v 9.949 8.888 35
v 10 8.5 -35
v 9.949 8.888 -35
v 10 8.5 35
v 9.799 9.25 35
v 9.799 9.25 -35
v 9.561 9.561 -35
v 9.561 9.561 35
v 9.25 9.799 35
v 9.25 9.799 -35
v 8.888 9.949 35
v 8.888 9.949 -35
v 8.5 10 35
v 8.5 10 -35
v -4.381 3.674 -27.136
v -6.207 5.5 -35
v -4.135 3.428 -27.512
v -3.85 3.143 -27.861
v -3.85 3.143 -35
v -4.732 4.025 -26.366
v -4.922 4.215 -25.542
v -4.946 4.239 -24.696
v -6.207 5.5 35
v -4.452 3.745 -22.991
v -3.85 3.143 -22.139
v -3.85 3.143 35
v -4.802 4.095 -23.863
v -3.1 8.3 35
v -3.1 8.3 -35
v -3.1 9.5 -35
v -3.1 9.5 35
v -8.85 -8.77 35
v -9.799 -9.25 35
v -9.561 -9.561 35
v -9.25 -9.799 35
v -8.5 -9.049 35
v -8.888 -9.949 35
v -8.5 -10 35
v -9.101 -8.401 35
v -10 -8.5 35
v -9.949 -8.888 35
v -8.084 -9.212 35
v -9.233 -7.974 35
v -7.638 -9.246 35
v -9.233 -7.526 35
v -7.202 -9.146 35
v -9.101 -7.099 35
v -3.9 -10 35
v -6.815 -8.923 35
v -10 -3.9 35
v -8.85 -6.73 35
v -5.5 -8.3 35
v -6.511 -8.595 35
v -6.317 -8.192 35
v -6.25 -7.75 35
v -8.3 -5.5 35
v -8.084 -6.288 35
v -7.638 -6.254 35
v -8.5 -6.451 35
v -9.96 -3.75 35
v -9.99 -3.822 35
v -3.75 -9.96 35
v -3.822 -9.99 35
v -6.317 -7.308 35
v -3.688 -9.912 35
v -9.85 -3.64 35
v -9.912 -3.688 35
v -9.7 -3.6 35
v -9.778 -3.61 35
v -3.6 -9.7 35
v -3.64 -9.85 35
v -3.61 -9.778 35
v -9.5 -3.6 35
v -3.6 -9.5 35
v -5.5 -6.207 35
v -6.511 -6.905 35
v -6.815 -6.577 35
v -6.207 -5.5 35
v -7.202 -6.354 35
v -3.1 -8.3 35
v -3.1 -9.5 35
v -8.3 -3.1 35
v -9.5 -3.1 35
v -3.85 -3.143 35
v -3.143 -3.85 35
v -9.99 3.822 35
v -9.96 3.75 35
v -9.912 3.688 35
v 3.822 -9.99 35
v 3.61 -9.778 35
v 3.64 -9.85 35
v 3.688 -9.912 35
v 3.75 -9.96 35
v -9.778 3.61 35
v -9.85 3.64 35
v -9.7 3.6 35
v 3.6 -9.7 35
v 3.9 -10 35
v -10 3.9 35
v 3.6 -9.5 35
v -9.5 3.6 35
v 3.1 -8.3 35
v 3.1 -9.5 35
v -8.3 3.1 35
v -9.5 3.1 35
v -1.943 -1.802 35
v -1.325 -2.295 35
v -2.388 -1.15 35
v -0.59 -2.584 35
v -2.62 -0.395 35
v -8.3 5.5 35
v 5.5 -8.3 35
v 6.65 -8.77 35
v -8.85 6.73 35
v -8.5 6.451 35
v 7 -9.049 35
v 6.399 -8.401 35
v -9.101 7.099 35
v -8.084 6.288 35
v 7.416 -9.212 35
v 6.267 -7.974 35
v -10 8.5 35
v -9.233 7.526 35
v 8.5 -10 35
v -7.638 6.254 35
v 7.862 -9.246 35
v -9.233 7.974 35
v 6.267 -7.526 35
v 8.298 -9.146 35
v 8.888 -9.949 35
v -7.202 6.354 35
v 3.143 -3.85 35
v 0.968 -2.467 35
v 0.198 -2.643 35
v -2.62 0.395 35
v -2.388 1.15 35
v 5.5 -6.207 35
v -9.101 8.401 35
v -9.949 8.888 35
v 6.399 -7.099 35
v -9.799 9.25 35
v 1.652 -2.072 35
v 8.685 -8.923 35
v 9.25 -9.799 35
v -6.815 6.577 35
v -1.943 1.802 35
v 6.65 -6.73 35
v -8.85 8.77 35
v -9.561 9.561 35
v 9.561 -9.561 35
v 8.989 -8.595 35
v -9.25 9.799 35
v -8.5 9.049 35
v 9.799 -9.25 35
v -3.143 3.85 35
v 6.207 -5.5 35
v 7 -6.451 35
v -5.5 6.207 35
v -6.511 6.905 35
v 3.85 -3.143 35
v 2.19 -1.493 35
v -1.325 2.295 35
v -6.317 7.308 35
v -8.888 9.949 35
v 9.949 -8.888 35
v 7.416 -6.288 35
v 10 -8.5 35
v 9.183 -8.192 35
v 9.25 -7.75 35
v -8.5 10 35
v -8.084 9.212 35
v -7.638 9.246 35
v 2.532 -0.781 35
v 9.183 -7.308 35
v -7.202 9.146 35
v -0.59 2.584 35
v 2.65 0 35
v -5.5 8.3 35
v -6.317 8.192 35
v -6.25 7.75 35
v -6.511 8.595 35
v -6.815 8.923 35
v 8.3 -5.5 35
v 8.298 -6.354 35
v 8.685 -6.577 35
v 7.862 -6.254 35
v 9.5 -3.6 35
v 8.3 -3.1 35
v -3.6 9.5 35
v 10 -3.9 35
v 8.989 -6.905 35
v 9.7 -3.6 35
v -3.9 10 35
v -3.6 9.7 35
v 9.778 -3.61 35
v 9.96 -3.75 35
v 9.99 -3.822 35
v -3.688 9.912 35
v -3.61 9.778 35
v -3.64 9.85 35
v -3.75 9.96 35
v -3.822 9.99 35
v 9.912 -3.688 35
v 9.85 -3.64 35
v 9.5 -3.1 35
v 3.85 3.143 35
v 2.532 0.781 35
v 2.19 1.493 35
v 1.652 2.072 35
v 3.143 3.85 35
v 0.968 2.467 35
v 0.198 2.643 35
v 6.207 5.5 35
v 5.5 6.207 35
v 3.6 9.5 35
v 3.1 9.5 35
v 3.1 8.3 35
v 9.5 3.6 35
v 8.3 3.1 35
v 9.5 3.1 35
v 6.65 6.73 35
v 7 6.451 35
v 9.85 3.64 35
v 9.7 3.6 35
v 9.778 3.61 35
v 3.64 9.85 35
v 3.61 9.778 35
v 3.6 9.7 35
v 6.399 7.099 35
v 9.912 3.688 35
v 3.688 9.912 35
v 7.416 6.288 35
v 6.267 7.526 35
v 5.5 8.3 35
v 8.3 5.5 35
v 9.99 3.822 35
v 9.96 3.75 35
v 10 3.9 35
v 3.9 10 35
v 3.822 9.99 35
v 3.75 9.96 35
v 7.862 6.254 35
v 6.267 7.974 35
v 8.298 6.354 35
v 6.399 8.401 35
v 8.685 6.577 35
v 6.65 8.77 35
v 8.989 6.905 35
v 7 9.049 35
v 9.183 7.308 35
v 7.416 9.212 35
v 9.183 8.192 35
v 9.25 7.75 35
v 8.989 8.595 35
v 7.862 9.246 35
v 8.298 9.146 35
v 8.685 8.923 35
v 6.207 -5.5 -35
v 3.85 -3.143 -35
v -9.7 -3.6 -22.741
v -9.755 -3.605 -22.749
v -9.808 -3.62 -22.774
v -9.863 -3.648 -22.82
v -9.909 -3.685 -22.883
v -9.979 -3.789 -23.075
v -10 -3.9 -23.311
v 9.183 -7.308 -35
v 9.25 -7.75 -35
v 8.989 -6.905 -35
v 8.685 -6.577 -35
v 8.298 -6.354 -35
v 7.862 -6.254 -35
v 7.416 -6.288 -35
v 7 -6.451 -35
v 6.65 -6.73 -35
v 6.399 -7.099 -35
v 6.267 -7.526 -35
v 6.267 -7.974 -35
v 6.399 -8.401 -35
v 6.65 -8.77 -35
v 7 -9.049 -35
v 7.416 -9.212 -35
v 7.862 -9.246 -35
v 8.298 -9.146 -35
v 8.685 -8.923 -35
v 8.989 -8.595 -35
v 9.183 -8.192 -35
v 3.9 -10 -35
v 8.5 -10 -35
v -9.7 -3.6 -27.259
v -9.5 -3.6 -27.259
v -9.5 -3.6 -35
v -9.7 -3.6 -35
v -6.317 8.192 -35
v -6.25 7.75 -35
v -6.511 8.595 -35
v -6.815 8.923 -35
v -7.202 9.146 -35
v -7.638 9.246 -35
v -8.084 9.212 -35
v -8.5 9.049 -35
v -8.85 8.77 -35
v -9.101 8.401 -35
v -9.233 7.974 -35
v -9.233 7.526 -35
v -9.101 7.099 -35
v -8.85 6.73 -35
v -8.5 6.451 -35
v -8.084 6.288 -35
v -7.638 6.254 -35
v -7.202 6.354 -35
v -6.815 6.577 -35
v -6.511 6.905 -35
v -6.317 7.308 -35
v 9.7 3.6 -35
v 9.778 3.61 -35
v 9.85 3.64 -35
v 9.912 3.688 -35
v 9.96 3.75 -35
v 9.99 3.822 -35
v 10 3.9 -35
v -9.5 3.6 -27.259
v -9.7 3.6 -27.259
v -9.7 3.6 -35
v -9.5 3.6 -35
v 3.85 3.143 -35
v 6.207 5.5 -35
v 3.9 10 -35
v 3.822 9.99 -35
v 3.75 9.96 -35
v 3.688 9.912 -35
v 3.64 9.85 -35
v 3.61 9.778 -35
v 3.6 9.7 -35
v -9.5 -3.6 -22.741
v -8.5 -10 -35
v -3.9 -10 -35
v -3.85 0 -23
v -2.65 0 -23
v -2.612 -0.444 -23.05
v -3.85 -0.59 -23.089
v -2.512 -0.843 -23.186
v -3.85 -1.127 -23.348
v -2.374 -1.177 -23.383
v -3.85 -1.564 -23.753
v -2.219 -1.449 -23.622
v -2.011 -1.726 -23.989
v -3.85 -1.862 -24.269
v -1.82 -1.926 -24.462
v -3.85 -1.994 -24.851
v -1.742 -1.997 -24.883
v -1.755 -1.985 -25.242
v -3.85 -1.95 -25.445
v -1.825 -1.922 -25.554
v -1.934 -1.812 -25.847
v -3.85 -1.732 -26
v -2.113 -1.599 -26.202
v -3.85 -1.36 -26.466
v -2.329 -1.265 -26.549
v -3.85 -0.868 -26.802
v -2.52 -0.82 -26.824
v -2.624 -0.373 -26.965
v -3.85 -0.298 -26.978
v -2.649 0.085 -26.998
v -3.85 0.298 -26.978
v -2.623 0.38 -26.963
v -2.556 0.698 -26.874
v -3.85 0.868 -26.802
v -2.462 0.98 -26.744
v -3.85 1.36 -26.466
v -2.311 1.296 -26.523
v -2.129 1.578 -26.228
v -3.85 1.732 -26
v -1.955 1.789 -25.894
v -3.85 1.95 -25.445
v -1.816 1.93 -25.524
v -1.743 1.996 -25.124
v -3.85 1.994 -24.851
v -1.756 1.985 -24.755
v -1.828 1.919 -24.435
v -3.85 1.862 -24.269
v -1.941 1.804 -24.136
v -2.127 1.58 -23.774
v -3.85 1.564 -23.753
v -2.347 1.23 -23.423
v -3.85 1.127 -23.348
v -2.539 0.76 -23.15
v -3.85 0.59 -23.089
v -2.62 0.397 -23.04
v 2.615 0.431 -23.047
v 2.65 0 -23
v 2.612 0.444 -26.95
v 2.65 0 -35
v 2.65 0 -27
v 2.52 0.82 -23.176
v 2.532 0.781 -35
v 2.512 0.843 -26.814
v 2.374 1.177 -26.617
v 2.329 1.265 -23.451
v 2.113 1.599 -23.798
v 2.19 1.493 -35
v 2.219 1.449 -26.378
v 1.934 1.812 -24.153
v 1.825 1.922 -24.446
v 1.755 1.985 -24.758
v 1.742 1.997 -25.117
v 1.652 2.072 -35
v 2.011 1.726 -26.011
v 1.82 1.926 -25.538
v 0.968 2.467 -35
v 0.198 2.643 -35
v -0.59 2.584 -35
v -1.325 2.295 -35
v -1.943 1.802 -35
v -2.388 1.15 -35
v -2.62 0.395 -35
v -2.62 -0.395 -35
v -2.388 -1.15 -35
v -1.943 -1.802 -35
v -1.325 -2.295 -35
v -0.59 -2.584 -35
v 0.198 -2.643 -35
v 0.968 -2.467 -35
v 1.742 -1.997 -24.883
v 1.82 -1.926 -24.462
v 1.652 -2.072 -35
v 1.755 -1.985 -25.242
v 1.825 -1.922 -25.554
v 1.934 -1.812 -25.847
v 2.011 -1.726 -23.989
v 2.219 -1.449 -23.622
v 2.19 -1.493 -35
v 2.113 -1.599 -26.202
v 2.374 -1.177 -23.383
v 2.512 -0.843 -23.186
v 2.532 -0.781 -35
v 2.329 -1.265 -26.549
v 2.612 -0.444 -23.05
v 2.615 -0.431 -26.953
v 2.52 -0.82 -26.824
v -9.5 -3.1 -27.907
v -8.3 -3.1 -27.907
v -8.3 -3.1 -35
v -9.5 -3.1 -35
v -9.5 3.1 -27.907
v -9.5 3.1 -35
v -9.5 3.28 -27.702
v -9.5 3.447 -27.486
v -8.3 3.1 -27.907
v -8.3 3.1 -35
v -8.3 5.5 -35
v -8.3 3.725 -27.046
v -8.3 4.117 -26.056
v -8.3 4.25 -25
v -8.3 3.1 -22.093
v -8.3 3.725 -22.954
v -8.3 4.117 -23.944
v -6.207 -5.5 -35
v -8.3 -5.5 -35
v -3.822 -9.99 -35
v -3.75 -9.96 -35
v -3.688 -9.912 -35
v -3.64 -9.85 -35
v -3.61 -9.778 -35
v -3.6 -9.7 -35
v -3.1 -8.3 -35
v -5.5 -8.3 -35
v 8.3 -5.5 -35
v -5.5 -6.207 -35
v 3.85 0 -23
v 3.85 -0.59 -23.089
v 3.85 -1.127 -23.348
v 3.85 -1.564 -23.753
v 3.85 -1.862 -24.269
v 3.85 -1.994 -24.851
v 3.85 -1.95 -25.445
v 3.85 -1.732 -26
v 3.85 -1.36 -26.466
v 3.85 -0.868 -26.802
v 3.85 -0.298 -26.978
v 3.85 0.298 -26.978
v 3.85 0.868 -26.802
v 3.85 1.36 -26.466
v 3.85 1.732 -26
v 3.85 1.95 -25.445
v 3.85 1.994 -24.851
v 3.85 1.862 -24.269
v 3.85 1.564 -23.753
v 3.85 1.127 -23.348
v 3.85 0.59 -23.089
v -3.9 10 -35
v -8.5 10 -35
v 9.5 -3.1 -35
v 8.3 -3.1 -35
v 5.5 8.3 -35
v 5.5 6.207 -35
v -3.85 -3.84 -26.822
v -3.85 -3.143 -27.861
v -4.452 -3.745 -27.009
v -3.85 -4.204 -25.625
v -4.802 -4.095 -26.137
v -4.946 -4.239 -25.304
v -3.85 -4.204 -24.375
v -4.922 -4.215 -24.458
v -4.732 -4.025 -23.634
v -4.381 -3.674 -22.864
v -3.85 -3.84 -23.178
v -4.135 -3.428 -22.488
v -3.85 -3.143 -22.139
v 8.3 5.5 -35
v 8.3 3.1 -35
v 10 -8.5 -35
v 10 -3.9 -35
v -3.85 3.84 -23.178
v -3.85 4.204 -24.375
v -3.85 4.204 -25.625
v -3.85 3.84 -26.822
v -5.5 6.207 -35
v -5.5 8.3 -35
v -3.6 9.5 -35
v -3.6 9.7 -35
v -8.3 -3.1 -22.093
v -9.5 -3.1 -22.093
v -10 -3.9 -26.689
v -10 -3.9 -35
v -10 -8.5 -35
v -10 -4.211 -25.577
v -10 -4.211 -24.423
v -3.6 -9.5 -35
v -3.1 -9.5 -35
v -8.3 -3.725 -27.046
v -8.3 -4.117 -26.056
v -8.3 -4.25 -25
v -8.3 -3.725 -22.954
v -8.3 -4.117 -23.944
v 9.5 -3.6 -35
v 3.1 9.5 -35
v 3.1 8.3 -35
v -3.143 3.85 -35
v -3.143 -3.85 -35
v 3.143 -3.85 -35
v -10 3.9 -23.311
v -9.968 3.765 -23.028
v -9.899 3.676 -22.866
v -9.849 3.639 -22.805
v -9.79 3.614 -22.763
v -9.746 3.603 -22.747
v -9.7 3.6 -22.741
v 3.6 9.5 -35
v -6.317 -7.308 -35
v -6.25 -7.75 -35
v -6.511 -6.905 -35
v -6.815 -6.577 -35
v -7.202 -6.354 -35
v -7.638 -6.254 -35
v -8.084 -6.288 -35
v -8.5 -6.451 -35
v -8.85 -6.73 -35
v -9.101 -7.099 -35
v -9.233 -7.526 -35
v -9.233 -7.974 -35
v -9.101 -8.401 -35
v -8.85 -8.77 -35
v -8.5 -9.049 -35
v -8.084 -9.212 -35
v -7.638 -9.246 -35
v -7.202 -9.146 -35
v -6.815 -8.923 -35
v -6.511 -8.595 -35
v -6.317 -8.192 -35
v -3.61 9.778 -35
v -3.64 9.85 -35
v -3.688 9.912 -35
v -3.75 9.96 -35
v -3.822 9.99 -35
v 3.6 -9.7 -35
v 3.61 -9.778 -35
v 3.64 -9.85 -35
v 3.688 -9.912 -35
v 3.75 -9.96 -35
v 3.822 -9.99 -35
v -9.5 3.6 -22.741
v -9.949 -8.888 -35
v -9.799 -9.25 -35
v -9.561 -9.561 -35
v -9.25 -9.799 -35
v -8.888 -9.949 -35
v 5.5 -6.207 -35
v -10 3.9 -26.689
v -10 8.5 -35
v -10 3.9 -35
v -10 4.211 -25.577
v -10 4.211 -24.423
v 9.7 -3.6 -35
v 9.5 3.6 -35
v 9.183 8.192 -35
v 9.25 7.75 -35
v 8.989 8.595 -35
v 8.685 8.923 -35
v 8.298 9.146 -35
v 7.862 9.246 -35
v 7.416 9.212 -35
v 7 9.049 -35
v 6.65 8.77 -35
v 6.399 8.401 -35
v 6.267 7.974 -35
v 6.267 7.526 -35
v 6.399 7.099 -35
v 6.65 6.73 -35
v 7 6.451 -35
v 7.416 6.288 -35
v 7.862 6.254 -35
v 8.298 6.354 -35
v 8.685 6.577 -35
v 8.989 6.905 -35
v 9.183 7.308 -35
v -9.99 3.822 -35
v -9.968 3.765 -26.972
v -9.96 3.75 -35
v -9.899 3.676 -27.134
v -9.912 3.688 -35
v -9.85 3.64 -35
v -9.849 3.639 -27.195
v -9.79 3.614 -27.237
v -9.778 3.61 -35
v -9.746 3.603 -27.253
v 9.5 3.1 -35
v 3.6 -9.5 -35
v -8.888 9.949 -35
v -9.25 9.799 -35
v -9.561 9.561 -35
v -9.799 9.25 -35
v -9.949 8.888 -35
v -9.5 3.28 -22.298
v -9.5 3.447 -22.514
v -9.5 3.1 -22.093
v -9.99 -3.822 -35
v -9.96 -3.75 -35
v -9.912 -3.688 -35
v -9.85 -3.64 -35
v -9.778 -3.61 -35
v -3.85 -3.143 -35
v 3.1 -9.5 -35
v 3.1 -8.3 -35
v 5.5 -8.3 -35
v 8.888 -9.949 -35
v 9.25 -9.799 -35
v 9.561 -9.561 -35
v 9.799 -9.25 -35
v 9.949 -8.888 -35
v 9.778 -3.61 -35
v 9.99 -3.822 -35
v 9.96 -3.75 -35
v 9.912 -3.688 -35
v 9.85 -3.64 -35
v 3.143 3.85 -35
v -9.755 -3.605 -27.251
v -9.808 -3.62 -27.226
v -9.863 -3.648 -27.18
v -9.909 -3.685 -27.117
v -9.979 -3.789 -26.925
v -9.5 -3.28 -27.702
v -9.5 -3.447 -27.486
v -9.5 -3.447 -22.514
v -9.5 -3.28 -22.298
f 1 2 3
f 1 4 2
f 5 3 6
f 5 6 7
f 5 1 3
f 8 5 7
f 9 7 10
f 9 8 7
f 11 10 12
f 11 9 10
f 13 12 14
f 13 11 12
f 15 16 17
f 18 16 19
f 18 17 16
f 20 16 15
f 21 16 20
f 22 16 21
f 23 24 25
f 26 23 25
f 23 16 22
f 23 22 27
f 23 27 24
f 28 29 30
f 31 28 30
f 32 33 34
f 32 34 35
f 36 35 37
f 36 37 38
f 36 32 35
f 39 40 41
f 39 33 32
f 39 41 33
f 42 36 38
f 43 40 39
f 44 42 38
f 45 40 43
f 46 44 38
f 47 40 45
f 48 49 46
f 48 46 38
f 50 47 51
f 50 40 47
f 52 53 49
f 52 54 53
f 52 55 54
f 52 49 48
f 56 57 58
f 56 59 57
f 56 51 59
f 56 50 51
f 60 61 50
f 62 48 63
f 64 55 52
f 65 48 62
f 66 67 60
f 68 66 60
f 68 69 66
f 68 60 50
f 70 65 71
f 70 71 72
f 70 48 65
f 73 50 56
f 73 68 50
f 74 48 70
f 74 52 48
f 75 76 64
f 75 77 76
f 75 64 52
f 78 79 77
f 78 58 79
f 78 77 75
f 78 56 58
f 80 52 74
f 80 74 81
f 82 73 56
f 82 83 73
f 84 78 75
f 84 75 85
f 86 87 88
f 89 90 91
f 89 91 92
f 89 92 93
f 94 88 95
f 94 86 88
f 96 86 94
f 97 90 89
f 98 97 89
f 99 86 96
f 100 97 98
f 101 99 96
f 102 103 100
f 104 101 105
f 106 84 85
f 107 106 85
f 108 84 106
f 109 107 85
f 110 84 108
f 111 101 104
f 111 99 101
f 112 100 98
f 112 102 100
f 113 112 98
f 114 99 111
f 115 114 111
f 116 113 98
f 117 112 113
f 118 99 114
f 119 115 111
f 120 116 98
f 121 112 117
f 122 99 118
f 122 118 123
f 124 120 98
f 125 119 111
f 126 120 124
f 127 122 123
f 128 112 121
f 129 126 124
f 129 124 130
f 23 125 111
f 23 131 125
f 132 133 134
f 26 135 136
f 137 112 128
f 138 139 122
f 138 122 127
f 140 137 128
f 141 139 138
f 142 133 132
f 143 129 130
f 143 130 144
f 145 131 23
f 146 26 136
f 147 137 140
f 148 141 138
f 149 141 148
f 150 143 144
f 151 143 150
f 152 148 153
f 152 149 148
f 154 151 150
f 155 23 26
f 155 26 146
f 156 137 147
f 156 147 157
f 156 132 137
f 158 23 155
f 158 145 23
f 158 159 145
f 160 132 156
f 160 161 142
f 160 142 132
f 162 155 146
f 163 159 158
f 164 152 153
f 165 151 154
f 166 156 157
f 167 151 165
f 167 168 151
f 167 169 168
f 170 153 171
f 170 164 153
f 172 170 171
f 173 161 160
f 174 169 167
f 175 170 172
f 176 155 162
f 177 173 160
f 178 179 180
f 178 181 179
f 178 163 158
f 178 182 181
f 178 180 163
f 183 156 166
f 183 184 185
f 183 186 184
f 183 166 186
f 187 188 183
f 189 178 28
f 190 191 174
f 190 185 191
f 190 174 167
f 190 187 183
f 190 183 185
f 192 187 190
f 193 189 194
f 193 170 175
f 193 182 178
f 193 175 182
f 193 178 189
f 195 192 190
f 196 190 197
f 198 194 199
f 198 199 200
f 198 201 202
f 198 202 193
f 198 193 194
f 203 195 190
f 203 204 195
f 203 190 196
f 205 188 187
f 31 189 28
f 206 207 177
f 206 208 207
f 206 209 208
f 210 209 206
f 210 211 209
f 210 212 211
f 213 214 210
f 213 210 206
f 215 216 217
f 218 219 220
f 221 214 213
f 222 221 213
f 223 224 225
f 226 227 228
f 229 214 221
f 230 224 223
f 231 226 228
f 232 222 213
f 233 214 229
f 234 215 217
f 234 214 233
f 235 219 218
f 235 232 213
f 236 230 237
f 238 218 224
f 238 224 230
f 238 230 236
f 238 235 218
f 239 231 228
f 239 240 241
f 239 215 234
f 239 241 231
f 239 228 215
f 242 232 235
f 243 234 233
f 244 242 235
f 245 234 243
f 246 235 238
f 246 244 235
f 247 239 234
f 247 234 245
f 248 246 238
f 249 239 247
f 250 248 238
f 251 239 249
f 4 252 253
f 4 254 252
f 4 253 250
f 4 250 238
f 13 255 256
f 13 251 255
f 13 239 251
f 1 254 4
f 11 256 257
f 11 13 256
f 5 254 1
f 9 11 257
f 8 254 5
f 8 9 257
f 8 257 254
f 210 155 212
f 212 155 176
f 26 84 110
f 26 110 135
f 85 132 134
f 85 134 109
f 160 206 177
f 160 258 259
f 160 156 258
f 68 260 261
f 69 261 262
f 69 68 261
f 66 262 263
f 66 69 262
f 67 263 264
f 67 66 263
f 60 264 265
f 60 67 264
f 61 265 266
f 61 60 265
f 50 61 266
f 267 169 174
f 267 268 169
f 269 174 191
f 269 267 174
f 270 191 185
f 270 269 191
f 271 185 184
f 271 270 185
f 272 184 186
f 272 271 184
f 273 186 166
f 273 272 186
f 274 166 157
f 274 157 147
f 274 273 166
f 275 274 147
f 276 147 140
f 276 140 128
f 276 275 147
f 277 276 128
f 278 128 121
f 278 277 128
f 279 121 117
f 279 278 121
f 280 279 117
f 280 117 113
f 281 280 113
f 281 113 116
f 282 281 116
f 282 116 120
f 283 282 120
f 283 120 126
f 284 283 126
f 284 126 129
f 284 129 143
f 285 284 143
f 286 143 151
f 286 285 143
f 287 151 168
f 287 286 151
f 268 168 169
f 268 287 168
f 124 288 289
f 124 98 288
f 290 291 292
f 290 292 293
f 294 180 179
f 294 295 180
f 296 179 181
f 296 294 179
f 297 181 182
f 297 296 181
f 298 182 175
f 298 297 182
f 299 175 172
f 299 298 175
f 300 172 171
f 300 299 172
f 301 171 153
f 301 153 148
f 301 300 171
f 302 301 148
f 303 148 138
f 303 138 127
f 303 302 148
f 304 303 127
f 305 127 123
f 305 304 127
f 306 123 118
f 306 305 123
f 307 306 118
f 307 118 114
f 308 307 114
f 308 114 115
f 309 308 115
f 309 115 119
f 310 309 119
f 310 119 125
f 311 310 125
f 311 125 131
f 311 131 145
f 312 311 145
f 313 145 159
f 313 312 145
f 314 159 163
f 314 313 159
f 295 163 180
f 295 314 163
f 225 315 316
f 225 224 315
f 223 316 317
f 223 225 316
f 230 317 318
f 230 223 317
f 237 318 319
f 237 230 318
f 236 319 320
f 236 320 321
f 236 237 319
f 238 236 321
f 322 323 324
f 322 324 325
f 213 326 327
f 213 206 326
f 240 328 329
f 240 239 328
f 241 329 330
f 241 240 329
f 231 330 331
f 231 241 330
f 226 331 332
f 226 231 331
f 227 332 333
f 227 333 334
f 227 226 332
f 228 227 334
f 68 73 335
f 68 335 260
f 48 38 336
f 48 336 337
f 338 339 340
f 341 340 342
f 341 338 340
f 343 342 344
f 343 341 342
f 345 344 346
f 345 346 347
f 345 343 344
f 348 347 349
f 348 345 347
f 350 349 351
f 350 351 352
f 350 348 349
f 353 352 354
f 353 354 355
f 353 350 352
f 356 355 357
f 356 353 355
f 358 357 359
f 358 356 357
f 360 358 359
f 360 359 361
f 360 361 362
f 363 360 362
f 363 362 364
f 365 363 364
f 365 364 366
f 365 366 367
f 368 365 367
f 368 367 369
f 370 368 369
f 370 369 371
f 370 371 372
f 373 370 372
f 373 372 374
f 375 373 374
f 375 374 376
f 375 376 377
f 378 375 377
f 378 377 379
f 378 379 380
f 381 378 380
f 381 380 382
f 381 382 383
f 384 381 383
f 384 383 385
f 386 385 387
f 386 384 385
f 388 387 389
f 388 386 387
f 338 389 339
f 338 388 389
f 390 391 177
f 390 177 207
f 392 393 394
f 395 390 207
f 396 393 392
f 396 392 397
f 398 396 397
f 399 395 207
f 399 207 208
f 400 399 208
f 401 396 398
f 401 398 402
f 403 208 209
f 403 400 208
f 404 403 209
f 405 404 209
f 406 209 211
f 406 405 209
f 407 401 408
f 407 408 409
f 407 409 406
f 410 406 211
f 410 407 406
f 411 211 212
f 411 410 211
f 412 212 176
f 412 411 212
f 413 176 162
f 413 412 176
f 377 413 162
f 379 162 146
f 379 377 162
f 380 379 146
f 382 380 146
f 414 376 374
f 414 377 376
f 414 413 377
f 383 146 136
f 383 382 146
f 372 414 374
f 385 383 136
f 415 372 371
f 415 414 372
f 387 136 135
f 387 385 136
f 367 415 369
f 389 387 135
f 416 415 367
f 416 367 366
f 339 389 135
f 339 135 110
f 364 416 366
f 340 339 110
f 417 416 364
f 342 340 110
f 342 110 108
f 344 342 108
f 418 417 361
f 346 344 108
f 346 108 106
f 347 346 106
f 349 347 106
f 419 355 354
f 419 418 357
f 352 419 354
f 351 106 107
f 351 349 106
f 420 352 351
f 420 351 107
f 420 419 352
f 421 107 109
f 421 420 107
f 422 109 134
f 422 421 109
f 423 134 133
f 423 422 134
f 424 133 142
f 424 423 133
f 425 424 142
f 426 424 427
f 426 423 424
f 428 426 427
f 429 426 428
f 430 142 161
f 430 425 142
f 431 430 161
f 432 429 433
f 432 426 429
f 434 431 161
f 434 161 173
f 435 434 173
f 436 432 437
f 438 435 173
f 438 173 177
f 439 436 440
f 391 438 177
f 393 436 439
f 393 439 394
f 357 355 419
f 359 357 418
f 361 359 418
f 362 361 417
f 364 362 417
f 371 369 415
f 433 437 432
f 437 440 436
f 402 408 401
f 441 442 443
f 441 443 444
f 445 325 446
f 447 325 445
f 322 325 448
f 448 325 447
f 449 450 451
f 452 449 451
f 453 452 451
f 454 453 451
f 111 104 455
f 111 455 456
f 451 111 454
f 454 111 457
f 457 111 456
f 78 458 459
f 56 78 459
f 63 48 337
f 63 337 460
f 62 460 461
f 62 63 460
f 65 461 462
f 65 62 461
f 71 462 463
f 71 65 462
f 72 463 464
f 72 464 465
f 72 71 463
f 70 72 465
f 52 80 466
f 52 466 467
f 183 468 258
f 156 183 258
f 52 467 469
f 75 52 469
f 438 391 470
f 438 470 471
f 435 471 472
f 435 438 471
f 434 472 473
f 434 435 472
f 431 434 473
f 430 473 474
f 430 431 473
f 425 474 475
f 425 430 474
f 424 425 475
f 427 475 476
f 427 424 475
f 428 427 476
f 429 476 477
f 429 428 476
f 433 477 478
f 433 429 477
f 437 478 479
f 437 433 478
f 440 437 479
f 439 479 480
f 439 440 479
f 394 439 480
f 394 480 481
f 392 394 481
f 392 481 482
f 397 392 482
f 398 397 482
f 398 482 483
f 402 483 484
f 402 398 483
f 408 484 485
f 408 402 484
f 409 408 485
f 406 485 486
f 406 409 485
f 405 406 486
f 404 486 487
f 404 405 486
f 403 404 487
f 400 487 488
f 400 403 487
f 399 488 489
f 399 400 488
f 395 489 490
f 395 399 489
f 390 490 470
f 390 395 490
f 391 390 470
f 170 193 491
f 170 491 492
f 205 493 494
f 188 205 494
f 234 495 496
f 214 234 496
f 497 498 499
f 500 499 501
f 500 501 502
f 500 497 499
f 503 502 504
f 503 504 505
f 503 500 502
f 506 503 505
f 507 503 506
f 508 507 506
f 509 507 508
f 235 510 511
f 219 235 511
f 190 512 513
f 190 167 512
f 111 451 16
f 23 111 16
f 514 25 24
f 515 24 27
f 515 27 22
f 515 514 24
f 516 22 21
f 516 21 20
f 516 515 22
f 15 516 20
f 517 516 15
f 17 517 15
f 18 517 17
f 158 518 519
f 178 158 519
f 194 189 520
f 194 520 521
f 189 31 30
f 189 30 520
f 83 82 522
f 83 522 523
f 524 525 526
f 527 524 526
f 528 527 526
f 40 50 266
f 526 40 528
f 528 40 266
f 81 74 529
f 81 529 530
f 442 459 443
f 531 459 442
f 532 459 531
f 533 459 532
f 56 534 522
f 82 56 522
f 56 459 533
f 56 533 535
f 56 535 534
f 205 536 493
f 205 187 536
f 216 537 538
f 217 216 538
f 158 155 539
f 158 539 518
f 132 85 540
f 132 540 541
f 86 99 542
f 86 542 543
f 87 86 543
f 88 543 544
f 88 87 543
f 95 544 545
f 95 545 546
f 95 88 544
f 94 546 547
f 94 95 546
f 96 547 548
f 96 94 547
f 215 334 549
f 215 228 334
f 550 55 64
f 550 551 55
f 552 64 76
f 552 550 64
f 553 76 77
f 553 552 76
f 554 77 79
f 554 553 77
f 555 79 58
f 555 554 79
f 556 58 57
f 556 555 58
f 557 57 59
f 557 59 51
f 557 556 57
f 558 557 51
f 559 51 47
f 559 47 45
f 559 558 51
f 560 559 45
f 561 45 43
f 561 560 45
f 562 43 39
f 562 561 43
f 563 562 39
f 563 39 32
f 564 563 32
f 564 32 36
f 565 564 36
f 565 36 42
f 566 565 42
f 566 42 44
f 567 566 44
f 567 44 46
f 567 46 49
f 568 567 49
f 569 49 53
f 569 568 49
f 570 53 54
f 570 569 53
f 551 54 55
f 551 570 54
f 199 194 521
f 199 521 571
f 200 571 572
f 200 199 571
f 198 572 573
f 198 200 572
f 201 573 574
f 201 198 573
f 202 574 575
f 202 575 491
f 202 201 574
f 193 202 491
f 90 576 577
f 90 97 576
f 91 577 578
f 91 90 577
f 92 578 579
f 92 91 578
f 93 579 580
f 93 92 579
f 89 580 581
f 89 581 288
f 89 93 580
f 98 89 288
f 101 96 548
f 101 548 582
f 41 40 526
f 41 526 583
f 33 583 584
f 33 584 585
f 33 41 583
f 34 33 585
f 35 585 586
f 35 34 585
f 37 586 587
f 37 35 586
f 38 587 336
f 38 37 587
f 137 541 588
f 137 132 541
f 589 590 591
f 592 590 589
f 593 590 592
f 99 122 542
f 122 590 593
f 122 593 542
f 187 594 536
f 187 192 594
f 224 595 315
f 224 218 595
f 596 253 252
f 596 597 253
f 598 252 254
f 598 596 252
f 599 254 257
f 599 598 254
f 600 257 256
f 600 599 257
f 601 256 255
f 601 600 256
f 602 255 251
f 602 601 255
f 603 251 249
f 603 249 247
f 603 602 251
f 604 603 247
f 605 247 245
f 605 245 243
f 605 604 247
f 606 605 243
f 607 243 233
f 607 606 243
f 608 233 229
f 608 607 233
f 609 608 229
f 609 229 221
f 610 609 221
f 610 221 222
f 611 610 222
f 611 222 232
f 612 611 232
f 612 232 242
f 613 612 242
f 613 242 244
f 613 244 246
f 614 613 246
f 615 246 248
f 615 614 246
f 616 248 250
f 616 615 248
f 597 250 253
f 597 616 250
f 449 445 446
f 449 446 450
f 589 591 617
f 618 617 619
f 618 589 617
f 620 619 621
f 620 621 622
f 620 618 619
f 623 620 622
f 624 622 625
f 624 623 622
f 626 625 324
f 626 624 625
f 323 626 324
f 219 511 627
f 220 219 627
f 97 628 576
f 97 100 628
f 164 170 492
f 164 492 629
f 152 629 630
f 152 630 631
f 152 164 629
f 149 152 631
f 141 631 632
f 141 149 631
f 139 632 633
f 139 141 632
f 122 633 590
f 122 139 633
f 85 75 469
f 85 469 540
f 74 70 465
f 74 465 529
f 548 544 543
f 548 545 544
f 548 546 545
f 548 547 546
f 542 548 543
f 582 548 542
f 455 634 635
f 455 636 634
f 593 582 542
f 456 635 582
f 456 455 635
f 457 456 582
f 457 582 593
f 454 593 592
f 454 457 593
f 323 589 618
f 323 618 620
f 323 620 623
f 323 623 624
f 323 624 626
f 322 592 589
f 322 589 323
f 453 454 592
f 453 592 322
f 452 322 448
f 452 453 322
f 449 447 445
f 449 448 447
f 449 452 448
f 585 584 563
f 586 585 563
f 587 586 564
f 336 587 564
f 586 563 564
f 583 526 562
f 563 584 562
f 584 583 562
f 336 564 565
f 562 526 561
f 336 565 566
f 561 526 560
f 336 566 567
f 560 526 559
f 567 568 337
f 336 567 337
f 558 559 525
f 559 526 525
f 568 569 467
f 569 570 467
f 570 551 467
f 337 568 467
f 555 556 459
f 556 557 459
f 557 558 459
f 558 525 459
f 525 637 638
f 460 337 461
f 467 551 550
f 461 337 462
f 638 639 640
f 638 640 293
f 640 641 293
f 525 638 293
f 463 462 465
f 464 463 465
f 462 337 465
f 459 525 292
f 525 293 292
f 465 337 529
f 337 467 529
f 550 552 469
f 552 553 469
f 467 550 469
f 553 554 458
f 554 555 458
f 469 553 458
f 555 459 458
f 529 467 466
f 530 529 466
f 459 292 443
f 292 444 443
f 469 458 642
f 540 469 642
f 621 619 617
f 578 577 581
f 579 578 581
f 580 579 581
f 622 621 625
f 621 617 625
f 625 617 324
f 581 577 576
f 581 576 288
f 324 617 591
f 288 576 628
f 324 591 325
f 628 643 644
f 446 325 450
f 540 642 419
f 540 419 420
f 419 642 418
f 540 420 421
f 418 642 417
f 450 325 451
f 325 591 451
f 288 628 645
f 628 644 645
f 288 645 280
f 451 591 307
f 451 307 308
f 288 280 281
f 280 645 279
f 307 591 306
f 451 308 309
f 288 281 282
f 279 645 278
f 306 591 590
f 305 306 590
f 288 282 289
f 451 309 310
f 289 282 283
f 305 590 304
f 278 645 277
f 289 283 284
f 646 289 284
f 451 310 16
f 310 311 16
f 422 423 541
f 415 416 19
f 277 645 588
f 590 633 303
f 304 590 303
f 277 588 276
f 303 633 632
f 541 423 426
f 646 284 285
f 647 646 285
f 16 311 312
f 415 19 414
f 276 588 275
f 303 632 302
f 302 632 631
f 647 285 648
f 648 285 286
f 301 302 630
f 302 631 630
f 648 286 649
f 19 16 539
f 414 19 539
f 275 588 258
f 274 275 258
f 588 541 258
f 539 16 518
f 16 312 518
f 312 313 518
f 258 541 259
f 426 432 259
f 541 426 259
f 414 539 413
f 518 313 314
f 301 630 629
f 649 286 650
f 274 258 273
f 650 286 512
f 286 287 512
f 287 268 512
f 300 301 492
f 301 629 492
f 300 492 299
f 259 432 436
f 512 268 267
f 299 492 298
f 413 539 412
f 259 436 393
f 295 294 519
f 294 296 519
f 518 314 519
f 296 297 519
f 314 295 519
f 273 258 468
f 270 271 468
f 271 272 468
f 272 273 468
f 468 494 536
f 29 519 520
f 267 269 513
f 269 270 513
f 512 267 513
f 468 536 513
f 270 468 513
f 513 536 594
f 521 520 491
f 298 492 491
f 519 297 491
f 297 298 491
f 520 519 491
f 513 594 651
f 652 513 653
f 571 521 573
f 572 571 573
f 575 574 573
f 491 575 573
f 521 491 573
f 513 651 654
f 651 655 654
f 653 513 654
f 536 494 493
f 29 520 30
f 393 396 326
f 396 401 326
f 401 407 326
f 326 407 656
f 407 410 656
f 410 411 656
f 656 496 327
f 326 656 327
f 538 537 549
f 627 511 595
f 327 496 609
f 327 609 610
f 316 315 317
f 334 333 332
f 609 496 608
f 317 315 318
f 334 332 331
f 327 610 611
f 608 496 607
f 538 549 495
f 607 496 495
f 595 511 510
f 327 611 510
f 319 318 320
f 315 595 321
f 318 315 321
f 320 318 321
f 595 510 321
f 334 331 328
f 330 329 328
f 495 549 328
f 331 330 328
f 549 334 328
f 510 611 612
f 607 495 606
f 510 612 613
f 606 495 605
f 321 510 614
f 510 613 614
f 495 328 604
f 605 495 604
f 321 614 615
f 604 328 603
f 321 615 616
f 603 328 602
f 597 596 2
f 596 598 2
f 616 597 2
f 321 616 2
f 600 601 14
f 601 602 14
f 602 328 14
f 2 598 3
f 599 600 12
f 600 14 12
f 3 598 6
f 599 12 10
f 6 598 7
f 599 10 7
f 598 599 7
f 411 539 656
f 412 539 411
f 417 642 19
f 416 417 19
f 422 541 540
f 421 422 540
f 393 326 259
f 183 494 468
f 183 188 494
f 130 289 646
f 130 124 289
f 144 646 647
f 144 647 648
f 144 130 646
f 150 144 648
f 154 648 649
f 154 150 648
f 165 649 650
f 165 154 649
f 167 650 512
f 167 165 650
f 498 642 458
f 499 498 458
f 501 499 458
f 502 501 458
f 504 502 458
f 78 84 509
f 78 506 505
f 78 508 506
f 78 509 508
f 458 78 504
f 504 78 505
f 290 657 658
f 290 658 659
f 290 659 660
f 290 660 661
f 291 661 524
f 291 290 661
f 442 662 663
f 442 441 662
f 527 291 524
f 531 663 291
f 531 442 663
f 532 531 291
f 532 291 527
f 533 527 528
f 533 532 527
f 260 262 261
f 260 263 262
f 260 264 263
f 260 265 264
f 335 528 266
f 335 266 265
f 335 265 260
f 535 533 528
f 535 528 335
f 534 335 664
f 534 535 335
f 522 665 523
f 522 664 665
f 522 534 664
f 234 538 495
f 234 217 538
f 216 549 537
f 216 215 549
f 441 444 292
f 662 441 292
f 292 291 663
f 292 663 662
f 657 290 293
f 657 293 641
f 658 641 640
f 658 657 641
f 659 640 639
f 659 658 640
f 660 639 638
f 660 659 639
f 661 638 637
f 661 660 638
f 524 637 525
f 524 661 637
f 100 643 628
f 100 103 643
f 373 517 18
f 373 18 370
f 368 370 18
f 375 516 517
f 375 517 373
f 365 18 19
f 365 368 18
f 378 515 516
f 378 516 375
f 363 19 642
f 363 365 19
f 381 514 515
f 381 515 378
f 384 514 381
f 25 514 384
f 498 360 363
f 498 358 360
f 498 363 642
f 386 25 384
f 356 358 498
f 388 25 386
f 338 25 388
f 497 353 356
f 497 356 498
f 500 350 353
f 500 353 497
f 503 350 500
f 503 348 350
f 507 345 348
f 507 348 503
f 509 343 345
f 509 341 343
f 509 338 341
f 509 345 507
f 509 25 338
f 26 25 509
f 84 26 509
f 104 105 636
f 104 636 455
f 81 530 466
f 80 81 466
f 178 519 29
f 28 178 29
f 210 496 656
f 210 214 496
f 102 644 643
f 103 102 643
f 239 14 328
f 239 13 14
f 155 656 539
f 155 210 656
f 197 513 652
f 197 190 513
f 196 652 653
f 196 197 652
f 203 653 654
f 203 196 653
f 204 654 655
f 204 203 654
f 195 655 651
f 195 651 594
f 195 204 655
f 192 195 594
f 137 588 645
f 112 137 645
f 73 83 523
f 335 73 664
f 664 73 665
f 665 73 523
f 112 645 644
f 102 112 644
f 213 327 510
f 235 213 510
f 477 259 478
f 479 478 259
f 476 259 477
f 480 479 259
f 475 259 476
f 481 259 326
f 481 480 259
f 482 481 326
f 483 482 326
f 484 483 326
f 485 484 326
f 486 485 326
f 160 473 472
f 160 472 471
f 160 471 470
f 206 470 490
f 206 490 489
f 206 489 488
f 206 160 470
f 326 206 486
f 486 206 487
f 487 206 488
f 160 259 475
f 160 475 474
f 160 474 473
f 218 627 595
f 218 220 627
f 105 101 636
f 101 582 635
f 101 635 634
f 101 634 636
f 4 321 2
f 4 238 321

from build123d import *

# Parameters (mm, degrees)
SKETCH_1_R               = 2.65
SKETCH_1_R_2             = 1.5
EXTRUDE_1_DEPTH          = 35
CUT_EXTRUDE_3_DEPTH      = 38.749172176
CUT_EXTRUDE_3_DEPTH_BACK = 38.749172176
SKETCH_5_R               = 2
SKETCH_6_R               = 4.25
CUT_EXTRUDE_4_DEPTH      = 39.946405572


with BuildPart() as part:
    # 草图1 → 凸台-拉伸1 (new, symmetric)
    with BuildSketch(Plane.XY):
        with BuildLine():
            Line((3.142893219, 3.85), (-3.142893219, 3.85))
            Line((-3.142893219, 3.85), (-5.5, 6.207106781))
            Line((-5.5, 6.207106781), (-5.5, 8.3))
            Line((-5.5, 8.3), (-3.1, 8.3))
            Line((-3.1, 8.3), (-3.1, 9.5))
            Line((-3.1, 9.5), (-3.6, 9.5))
            Line((-3.6, 9.5), (-3.6, 9.7))
            ThreePointArc((-3.6, 9.7), (-3.687867966, 9.912132034), (-3.9, 10))
            Line((-3.9, 10), (-8.5, 10))
            ThreePointArc((-8.5, 10), (-9.560660172, 9.560660172), (-10, 8.5))
            Line((-10, 8.5), (-10, 3.9))
            ThreePointArc((-10, 3.9), (-9.912132034, 3.687867966), (-9.7, 3.6))
            Line((-9.7, 3.6), (-9.5, 3.6))
            Line((-9.5, 3.6), (-9.5, 3.1))
            Line((-9.5, 3.1), (-8.3, 3.1))
            Line((-8.3, 3.1), (-8.3, 5.5))
            Line((-8.3, 5.5), (-6.207106781, 5.5))
            Line((-6.207106781, 5.5), (-3.85, 3.142893219))
            Line((-3.85, 3.142893219), (-3.85, -3.142893219))
            Line((-3.85, -3.142893219), (-6.207106781, -5.5))
            Line((-6.207106781, -5.5), (-8.3, -5.5))
            Line((-8.3, -5.5), (-8.3, -3.1))
            Line((-8.3, -3.1), (-9.5, -3.1))
            Line((-9.5, -3.1), (-9.5, -3.6))
            Line((-9.5, -3.6), (-9.7, -3.6))
            ThreePointArc((-9.7, -3.6), (-9.912132034, -3.687867966), (-10, -3.9))
            Line((-10, -3.9), (-10, -8.5))
            ThreePointArc((-10, -8.5), (-9.560660172, -9.560660172), (-8.5, -10))
            Line((-8.5, -10), (-3.9, -10))
            ThreePointArc((-3.9, -10), (-3.687867966, -9.912132034), (-3.6, -9.7))
            Line((-3.6, -9.7), (-3.6, -9.5))
            Line((-3.6, -9.5), (-3.1, -9.5))
            Line((-3.1, -9.5), (-3.1, -8.3))
            Line((-3.1, -8.3), (-5.5, -8.3))
            Line((-5.5, -8.3), (-5.5, -6.207106781))
            Line((-5.5, -6.207106781), (-3.142893219, -3.85))
            Line((-3.142893219, -3.85), (3.142893219, -3.85))
            Line((3.142893219, -3.85), (5.5, -6.207106781))
            Line((5.5, -6.207106781), (5.5, -8.3))
            Line((5.5, -8.3), (3.1, -8.3))
            Line((3.1, -8.3), (3.1, -9.5))
            Line((3.1, -9.5), (3.6, -9.5))
            Line((3.6, -9.5), (3.6, -9.7))
            ThreePointArc((3.6, -9.7), (3.687867966, -9.912132034), (3.9, -10))
            Line((3.9, -10), (8.5, -10))
            ThreePointArc((8.5, -10), (9.560660172, -9.560660172), (10, -8.5))
            Line((10, -8.5), (10, -3.9))
            ThreePointArc((10, -3.9), (9.912132034, -3.687867966), (9.7, -3.6))
            Line((9.7, -3.6), (9.5, -3.6))
            Line((9.5, -3.6), (9.5, -3.1))
            Line((9.5, -3.1), (8.3, -3.1))
            Line((8.3, -3.1), (8.3, -5.5))
            Line((8.3, -5.5), (6.207106781, -5.5))
            Line((6.207106781, -5.5), (3.85, -3.142893219))
            Line((3.85, -3.142893219), (3.85, 3.142893219))
            Line((3.85, 3.142893219), (6.207106781, 5.5))
            Line((6.207106781, 5.5), (8.3, 5.5))
            Line((8.3, 5.5), (8.3, 3.1))
            Line((8.3, 3.1), (9.5, 3.1))
            Line((9.5, 3.1), (9.5, 3.6))
            Line((9.5, 3.6), (9.7, 3.6))
            ThreePointArc((9.7, 3.6), (9.912132034, 3.687867966), (10, 3.9))
            Line((10, 3.9), (10, 8.5))
            ThreePointArc((10, 8.5), (9.560660172, 9.560660172), (8.5, 10))
            Line((8.5, 10), (3.9, 10))
            ThreePointArc((3.9, 10), (3.687867966, 9.912132034), (3.6, 9.7))
            Line((3.6, 9.7), (3.6, 9.5))
            Line((3.6, 9.5), (3.1, 9.5))
            Line((3.1, 9.5), (3.1, 8.3))
            Line((3.1, 8.3), (5.5, 8.3))
            Line((5.5, 8.3), (5.5, 6.207106781))
            Line((5.5, 6.207106781), (3.142893219, 3.85))
        make_face()
        Circle(SKETCH_1_R, mode=Mode.SUBTRACT)
        with Locations((-7.75, 7.75)):
            Circle(SKETCH_1_R_2, mode=Mode.SUBTRACT)
        with Locations((7.75, 7.75)):
            Circle(SKETCH_1_R_2, mode=Mode.SUBTRACT)
        with Locations((7.75, -7.75)):
            Circle(SKETCH_1_R_2, mode=Mode.SUBTRACT)
        with Locations((-7.75, -7.75)):
            Circle(SKETCH_1_R_2, mode=Mode.SUBTRACT)
    extrude(amount=EXTRUDE_1_DEPTH, both=True)

    # 草图5 → 切除-拉伸3 (cut, two sides: drawn at the far end of the back side and taken through both)
    with BuildSketch(Plane(origin=(0, 0, 0), x_dir=(0, 0, -1), z_dir=(1, 0, 0)).offset(-CUT_EXTRUDE_3_DEPTH_BACK)):
        with Locations(Location((25, 0, 0), (0, 0, 180))):
            Circle(SKETCH_5_R)
    extrude(amount=CUT_EXTRUDE_3_DEPTH + CUT_EXTRUDE_3_DEPTH_BACK, mode=Mode.SUBTRACT)

    # 草图6 → 切除-拉伸4 (cut, through all)
    with BuildSketch(Plane.ZY.offset(3.85)):
        with Locations((-25, 0)):
            Circle(SKETCH_6_R)
    extrude(amount=CUT_EXTRUDE_4_DEPTH, mode=Mode.SUBTRACT)


solid = part.part
